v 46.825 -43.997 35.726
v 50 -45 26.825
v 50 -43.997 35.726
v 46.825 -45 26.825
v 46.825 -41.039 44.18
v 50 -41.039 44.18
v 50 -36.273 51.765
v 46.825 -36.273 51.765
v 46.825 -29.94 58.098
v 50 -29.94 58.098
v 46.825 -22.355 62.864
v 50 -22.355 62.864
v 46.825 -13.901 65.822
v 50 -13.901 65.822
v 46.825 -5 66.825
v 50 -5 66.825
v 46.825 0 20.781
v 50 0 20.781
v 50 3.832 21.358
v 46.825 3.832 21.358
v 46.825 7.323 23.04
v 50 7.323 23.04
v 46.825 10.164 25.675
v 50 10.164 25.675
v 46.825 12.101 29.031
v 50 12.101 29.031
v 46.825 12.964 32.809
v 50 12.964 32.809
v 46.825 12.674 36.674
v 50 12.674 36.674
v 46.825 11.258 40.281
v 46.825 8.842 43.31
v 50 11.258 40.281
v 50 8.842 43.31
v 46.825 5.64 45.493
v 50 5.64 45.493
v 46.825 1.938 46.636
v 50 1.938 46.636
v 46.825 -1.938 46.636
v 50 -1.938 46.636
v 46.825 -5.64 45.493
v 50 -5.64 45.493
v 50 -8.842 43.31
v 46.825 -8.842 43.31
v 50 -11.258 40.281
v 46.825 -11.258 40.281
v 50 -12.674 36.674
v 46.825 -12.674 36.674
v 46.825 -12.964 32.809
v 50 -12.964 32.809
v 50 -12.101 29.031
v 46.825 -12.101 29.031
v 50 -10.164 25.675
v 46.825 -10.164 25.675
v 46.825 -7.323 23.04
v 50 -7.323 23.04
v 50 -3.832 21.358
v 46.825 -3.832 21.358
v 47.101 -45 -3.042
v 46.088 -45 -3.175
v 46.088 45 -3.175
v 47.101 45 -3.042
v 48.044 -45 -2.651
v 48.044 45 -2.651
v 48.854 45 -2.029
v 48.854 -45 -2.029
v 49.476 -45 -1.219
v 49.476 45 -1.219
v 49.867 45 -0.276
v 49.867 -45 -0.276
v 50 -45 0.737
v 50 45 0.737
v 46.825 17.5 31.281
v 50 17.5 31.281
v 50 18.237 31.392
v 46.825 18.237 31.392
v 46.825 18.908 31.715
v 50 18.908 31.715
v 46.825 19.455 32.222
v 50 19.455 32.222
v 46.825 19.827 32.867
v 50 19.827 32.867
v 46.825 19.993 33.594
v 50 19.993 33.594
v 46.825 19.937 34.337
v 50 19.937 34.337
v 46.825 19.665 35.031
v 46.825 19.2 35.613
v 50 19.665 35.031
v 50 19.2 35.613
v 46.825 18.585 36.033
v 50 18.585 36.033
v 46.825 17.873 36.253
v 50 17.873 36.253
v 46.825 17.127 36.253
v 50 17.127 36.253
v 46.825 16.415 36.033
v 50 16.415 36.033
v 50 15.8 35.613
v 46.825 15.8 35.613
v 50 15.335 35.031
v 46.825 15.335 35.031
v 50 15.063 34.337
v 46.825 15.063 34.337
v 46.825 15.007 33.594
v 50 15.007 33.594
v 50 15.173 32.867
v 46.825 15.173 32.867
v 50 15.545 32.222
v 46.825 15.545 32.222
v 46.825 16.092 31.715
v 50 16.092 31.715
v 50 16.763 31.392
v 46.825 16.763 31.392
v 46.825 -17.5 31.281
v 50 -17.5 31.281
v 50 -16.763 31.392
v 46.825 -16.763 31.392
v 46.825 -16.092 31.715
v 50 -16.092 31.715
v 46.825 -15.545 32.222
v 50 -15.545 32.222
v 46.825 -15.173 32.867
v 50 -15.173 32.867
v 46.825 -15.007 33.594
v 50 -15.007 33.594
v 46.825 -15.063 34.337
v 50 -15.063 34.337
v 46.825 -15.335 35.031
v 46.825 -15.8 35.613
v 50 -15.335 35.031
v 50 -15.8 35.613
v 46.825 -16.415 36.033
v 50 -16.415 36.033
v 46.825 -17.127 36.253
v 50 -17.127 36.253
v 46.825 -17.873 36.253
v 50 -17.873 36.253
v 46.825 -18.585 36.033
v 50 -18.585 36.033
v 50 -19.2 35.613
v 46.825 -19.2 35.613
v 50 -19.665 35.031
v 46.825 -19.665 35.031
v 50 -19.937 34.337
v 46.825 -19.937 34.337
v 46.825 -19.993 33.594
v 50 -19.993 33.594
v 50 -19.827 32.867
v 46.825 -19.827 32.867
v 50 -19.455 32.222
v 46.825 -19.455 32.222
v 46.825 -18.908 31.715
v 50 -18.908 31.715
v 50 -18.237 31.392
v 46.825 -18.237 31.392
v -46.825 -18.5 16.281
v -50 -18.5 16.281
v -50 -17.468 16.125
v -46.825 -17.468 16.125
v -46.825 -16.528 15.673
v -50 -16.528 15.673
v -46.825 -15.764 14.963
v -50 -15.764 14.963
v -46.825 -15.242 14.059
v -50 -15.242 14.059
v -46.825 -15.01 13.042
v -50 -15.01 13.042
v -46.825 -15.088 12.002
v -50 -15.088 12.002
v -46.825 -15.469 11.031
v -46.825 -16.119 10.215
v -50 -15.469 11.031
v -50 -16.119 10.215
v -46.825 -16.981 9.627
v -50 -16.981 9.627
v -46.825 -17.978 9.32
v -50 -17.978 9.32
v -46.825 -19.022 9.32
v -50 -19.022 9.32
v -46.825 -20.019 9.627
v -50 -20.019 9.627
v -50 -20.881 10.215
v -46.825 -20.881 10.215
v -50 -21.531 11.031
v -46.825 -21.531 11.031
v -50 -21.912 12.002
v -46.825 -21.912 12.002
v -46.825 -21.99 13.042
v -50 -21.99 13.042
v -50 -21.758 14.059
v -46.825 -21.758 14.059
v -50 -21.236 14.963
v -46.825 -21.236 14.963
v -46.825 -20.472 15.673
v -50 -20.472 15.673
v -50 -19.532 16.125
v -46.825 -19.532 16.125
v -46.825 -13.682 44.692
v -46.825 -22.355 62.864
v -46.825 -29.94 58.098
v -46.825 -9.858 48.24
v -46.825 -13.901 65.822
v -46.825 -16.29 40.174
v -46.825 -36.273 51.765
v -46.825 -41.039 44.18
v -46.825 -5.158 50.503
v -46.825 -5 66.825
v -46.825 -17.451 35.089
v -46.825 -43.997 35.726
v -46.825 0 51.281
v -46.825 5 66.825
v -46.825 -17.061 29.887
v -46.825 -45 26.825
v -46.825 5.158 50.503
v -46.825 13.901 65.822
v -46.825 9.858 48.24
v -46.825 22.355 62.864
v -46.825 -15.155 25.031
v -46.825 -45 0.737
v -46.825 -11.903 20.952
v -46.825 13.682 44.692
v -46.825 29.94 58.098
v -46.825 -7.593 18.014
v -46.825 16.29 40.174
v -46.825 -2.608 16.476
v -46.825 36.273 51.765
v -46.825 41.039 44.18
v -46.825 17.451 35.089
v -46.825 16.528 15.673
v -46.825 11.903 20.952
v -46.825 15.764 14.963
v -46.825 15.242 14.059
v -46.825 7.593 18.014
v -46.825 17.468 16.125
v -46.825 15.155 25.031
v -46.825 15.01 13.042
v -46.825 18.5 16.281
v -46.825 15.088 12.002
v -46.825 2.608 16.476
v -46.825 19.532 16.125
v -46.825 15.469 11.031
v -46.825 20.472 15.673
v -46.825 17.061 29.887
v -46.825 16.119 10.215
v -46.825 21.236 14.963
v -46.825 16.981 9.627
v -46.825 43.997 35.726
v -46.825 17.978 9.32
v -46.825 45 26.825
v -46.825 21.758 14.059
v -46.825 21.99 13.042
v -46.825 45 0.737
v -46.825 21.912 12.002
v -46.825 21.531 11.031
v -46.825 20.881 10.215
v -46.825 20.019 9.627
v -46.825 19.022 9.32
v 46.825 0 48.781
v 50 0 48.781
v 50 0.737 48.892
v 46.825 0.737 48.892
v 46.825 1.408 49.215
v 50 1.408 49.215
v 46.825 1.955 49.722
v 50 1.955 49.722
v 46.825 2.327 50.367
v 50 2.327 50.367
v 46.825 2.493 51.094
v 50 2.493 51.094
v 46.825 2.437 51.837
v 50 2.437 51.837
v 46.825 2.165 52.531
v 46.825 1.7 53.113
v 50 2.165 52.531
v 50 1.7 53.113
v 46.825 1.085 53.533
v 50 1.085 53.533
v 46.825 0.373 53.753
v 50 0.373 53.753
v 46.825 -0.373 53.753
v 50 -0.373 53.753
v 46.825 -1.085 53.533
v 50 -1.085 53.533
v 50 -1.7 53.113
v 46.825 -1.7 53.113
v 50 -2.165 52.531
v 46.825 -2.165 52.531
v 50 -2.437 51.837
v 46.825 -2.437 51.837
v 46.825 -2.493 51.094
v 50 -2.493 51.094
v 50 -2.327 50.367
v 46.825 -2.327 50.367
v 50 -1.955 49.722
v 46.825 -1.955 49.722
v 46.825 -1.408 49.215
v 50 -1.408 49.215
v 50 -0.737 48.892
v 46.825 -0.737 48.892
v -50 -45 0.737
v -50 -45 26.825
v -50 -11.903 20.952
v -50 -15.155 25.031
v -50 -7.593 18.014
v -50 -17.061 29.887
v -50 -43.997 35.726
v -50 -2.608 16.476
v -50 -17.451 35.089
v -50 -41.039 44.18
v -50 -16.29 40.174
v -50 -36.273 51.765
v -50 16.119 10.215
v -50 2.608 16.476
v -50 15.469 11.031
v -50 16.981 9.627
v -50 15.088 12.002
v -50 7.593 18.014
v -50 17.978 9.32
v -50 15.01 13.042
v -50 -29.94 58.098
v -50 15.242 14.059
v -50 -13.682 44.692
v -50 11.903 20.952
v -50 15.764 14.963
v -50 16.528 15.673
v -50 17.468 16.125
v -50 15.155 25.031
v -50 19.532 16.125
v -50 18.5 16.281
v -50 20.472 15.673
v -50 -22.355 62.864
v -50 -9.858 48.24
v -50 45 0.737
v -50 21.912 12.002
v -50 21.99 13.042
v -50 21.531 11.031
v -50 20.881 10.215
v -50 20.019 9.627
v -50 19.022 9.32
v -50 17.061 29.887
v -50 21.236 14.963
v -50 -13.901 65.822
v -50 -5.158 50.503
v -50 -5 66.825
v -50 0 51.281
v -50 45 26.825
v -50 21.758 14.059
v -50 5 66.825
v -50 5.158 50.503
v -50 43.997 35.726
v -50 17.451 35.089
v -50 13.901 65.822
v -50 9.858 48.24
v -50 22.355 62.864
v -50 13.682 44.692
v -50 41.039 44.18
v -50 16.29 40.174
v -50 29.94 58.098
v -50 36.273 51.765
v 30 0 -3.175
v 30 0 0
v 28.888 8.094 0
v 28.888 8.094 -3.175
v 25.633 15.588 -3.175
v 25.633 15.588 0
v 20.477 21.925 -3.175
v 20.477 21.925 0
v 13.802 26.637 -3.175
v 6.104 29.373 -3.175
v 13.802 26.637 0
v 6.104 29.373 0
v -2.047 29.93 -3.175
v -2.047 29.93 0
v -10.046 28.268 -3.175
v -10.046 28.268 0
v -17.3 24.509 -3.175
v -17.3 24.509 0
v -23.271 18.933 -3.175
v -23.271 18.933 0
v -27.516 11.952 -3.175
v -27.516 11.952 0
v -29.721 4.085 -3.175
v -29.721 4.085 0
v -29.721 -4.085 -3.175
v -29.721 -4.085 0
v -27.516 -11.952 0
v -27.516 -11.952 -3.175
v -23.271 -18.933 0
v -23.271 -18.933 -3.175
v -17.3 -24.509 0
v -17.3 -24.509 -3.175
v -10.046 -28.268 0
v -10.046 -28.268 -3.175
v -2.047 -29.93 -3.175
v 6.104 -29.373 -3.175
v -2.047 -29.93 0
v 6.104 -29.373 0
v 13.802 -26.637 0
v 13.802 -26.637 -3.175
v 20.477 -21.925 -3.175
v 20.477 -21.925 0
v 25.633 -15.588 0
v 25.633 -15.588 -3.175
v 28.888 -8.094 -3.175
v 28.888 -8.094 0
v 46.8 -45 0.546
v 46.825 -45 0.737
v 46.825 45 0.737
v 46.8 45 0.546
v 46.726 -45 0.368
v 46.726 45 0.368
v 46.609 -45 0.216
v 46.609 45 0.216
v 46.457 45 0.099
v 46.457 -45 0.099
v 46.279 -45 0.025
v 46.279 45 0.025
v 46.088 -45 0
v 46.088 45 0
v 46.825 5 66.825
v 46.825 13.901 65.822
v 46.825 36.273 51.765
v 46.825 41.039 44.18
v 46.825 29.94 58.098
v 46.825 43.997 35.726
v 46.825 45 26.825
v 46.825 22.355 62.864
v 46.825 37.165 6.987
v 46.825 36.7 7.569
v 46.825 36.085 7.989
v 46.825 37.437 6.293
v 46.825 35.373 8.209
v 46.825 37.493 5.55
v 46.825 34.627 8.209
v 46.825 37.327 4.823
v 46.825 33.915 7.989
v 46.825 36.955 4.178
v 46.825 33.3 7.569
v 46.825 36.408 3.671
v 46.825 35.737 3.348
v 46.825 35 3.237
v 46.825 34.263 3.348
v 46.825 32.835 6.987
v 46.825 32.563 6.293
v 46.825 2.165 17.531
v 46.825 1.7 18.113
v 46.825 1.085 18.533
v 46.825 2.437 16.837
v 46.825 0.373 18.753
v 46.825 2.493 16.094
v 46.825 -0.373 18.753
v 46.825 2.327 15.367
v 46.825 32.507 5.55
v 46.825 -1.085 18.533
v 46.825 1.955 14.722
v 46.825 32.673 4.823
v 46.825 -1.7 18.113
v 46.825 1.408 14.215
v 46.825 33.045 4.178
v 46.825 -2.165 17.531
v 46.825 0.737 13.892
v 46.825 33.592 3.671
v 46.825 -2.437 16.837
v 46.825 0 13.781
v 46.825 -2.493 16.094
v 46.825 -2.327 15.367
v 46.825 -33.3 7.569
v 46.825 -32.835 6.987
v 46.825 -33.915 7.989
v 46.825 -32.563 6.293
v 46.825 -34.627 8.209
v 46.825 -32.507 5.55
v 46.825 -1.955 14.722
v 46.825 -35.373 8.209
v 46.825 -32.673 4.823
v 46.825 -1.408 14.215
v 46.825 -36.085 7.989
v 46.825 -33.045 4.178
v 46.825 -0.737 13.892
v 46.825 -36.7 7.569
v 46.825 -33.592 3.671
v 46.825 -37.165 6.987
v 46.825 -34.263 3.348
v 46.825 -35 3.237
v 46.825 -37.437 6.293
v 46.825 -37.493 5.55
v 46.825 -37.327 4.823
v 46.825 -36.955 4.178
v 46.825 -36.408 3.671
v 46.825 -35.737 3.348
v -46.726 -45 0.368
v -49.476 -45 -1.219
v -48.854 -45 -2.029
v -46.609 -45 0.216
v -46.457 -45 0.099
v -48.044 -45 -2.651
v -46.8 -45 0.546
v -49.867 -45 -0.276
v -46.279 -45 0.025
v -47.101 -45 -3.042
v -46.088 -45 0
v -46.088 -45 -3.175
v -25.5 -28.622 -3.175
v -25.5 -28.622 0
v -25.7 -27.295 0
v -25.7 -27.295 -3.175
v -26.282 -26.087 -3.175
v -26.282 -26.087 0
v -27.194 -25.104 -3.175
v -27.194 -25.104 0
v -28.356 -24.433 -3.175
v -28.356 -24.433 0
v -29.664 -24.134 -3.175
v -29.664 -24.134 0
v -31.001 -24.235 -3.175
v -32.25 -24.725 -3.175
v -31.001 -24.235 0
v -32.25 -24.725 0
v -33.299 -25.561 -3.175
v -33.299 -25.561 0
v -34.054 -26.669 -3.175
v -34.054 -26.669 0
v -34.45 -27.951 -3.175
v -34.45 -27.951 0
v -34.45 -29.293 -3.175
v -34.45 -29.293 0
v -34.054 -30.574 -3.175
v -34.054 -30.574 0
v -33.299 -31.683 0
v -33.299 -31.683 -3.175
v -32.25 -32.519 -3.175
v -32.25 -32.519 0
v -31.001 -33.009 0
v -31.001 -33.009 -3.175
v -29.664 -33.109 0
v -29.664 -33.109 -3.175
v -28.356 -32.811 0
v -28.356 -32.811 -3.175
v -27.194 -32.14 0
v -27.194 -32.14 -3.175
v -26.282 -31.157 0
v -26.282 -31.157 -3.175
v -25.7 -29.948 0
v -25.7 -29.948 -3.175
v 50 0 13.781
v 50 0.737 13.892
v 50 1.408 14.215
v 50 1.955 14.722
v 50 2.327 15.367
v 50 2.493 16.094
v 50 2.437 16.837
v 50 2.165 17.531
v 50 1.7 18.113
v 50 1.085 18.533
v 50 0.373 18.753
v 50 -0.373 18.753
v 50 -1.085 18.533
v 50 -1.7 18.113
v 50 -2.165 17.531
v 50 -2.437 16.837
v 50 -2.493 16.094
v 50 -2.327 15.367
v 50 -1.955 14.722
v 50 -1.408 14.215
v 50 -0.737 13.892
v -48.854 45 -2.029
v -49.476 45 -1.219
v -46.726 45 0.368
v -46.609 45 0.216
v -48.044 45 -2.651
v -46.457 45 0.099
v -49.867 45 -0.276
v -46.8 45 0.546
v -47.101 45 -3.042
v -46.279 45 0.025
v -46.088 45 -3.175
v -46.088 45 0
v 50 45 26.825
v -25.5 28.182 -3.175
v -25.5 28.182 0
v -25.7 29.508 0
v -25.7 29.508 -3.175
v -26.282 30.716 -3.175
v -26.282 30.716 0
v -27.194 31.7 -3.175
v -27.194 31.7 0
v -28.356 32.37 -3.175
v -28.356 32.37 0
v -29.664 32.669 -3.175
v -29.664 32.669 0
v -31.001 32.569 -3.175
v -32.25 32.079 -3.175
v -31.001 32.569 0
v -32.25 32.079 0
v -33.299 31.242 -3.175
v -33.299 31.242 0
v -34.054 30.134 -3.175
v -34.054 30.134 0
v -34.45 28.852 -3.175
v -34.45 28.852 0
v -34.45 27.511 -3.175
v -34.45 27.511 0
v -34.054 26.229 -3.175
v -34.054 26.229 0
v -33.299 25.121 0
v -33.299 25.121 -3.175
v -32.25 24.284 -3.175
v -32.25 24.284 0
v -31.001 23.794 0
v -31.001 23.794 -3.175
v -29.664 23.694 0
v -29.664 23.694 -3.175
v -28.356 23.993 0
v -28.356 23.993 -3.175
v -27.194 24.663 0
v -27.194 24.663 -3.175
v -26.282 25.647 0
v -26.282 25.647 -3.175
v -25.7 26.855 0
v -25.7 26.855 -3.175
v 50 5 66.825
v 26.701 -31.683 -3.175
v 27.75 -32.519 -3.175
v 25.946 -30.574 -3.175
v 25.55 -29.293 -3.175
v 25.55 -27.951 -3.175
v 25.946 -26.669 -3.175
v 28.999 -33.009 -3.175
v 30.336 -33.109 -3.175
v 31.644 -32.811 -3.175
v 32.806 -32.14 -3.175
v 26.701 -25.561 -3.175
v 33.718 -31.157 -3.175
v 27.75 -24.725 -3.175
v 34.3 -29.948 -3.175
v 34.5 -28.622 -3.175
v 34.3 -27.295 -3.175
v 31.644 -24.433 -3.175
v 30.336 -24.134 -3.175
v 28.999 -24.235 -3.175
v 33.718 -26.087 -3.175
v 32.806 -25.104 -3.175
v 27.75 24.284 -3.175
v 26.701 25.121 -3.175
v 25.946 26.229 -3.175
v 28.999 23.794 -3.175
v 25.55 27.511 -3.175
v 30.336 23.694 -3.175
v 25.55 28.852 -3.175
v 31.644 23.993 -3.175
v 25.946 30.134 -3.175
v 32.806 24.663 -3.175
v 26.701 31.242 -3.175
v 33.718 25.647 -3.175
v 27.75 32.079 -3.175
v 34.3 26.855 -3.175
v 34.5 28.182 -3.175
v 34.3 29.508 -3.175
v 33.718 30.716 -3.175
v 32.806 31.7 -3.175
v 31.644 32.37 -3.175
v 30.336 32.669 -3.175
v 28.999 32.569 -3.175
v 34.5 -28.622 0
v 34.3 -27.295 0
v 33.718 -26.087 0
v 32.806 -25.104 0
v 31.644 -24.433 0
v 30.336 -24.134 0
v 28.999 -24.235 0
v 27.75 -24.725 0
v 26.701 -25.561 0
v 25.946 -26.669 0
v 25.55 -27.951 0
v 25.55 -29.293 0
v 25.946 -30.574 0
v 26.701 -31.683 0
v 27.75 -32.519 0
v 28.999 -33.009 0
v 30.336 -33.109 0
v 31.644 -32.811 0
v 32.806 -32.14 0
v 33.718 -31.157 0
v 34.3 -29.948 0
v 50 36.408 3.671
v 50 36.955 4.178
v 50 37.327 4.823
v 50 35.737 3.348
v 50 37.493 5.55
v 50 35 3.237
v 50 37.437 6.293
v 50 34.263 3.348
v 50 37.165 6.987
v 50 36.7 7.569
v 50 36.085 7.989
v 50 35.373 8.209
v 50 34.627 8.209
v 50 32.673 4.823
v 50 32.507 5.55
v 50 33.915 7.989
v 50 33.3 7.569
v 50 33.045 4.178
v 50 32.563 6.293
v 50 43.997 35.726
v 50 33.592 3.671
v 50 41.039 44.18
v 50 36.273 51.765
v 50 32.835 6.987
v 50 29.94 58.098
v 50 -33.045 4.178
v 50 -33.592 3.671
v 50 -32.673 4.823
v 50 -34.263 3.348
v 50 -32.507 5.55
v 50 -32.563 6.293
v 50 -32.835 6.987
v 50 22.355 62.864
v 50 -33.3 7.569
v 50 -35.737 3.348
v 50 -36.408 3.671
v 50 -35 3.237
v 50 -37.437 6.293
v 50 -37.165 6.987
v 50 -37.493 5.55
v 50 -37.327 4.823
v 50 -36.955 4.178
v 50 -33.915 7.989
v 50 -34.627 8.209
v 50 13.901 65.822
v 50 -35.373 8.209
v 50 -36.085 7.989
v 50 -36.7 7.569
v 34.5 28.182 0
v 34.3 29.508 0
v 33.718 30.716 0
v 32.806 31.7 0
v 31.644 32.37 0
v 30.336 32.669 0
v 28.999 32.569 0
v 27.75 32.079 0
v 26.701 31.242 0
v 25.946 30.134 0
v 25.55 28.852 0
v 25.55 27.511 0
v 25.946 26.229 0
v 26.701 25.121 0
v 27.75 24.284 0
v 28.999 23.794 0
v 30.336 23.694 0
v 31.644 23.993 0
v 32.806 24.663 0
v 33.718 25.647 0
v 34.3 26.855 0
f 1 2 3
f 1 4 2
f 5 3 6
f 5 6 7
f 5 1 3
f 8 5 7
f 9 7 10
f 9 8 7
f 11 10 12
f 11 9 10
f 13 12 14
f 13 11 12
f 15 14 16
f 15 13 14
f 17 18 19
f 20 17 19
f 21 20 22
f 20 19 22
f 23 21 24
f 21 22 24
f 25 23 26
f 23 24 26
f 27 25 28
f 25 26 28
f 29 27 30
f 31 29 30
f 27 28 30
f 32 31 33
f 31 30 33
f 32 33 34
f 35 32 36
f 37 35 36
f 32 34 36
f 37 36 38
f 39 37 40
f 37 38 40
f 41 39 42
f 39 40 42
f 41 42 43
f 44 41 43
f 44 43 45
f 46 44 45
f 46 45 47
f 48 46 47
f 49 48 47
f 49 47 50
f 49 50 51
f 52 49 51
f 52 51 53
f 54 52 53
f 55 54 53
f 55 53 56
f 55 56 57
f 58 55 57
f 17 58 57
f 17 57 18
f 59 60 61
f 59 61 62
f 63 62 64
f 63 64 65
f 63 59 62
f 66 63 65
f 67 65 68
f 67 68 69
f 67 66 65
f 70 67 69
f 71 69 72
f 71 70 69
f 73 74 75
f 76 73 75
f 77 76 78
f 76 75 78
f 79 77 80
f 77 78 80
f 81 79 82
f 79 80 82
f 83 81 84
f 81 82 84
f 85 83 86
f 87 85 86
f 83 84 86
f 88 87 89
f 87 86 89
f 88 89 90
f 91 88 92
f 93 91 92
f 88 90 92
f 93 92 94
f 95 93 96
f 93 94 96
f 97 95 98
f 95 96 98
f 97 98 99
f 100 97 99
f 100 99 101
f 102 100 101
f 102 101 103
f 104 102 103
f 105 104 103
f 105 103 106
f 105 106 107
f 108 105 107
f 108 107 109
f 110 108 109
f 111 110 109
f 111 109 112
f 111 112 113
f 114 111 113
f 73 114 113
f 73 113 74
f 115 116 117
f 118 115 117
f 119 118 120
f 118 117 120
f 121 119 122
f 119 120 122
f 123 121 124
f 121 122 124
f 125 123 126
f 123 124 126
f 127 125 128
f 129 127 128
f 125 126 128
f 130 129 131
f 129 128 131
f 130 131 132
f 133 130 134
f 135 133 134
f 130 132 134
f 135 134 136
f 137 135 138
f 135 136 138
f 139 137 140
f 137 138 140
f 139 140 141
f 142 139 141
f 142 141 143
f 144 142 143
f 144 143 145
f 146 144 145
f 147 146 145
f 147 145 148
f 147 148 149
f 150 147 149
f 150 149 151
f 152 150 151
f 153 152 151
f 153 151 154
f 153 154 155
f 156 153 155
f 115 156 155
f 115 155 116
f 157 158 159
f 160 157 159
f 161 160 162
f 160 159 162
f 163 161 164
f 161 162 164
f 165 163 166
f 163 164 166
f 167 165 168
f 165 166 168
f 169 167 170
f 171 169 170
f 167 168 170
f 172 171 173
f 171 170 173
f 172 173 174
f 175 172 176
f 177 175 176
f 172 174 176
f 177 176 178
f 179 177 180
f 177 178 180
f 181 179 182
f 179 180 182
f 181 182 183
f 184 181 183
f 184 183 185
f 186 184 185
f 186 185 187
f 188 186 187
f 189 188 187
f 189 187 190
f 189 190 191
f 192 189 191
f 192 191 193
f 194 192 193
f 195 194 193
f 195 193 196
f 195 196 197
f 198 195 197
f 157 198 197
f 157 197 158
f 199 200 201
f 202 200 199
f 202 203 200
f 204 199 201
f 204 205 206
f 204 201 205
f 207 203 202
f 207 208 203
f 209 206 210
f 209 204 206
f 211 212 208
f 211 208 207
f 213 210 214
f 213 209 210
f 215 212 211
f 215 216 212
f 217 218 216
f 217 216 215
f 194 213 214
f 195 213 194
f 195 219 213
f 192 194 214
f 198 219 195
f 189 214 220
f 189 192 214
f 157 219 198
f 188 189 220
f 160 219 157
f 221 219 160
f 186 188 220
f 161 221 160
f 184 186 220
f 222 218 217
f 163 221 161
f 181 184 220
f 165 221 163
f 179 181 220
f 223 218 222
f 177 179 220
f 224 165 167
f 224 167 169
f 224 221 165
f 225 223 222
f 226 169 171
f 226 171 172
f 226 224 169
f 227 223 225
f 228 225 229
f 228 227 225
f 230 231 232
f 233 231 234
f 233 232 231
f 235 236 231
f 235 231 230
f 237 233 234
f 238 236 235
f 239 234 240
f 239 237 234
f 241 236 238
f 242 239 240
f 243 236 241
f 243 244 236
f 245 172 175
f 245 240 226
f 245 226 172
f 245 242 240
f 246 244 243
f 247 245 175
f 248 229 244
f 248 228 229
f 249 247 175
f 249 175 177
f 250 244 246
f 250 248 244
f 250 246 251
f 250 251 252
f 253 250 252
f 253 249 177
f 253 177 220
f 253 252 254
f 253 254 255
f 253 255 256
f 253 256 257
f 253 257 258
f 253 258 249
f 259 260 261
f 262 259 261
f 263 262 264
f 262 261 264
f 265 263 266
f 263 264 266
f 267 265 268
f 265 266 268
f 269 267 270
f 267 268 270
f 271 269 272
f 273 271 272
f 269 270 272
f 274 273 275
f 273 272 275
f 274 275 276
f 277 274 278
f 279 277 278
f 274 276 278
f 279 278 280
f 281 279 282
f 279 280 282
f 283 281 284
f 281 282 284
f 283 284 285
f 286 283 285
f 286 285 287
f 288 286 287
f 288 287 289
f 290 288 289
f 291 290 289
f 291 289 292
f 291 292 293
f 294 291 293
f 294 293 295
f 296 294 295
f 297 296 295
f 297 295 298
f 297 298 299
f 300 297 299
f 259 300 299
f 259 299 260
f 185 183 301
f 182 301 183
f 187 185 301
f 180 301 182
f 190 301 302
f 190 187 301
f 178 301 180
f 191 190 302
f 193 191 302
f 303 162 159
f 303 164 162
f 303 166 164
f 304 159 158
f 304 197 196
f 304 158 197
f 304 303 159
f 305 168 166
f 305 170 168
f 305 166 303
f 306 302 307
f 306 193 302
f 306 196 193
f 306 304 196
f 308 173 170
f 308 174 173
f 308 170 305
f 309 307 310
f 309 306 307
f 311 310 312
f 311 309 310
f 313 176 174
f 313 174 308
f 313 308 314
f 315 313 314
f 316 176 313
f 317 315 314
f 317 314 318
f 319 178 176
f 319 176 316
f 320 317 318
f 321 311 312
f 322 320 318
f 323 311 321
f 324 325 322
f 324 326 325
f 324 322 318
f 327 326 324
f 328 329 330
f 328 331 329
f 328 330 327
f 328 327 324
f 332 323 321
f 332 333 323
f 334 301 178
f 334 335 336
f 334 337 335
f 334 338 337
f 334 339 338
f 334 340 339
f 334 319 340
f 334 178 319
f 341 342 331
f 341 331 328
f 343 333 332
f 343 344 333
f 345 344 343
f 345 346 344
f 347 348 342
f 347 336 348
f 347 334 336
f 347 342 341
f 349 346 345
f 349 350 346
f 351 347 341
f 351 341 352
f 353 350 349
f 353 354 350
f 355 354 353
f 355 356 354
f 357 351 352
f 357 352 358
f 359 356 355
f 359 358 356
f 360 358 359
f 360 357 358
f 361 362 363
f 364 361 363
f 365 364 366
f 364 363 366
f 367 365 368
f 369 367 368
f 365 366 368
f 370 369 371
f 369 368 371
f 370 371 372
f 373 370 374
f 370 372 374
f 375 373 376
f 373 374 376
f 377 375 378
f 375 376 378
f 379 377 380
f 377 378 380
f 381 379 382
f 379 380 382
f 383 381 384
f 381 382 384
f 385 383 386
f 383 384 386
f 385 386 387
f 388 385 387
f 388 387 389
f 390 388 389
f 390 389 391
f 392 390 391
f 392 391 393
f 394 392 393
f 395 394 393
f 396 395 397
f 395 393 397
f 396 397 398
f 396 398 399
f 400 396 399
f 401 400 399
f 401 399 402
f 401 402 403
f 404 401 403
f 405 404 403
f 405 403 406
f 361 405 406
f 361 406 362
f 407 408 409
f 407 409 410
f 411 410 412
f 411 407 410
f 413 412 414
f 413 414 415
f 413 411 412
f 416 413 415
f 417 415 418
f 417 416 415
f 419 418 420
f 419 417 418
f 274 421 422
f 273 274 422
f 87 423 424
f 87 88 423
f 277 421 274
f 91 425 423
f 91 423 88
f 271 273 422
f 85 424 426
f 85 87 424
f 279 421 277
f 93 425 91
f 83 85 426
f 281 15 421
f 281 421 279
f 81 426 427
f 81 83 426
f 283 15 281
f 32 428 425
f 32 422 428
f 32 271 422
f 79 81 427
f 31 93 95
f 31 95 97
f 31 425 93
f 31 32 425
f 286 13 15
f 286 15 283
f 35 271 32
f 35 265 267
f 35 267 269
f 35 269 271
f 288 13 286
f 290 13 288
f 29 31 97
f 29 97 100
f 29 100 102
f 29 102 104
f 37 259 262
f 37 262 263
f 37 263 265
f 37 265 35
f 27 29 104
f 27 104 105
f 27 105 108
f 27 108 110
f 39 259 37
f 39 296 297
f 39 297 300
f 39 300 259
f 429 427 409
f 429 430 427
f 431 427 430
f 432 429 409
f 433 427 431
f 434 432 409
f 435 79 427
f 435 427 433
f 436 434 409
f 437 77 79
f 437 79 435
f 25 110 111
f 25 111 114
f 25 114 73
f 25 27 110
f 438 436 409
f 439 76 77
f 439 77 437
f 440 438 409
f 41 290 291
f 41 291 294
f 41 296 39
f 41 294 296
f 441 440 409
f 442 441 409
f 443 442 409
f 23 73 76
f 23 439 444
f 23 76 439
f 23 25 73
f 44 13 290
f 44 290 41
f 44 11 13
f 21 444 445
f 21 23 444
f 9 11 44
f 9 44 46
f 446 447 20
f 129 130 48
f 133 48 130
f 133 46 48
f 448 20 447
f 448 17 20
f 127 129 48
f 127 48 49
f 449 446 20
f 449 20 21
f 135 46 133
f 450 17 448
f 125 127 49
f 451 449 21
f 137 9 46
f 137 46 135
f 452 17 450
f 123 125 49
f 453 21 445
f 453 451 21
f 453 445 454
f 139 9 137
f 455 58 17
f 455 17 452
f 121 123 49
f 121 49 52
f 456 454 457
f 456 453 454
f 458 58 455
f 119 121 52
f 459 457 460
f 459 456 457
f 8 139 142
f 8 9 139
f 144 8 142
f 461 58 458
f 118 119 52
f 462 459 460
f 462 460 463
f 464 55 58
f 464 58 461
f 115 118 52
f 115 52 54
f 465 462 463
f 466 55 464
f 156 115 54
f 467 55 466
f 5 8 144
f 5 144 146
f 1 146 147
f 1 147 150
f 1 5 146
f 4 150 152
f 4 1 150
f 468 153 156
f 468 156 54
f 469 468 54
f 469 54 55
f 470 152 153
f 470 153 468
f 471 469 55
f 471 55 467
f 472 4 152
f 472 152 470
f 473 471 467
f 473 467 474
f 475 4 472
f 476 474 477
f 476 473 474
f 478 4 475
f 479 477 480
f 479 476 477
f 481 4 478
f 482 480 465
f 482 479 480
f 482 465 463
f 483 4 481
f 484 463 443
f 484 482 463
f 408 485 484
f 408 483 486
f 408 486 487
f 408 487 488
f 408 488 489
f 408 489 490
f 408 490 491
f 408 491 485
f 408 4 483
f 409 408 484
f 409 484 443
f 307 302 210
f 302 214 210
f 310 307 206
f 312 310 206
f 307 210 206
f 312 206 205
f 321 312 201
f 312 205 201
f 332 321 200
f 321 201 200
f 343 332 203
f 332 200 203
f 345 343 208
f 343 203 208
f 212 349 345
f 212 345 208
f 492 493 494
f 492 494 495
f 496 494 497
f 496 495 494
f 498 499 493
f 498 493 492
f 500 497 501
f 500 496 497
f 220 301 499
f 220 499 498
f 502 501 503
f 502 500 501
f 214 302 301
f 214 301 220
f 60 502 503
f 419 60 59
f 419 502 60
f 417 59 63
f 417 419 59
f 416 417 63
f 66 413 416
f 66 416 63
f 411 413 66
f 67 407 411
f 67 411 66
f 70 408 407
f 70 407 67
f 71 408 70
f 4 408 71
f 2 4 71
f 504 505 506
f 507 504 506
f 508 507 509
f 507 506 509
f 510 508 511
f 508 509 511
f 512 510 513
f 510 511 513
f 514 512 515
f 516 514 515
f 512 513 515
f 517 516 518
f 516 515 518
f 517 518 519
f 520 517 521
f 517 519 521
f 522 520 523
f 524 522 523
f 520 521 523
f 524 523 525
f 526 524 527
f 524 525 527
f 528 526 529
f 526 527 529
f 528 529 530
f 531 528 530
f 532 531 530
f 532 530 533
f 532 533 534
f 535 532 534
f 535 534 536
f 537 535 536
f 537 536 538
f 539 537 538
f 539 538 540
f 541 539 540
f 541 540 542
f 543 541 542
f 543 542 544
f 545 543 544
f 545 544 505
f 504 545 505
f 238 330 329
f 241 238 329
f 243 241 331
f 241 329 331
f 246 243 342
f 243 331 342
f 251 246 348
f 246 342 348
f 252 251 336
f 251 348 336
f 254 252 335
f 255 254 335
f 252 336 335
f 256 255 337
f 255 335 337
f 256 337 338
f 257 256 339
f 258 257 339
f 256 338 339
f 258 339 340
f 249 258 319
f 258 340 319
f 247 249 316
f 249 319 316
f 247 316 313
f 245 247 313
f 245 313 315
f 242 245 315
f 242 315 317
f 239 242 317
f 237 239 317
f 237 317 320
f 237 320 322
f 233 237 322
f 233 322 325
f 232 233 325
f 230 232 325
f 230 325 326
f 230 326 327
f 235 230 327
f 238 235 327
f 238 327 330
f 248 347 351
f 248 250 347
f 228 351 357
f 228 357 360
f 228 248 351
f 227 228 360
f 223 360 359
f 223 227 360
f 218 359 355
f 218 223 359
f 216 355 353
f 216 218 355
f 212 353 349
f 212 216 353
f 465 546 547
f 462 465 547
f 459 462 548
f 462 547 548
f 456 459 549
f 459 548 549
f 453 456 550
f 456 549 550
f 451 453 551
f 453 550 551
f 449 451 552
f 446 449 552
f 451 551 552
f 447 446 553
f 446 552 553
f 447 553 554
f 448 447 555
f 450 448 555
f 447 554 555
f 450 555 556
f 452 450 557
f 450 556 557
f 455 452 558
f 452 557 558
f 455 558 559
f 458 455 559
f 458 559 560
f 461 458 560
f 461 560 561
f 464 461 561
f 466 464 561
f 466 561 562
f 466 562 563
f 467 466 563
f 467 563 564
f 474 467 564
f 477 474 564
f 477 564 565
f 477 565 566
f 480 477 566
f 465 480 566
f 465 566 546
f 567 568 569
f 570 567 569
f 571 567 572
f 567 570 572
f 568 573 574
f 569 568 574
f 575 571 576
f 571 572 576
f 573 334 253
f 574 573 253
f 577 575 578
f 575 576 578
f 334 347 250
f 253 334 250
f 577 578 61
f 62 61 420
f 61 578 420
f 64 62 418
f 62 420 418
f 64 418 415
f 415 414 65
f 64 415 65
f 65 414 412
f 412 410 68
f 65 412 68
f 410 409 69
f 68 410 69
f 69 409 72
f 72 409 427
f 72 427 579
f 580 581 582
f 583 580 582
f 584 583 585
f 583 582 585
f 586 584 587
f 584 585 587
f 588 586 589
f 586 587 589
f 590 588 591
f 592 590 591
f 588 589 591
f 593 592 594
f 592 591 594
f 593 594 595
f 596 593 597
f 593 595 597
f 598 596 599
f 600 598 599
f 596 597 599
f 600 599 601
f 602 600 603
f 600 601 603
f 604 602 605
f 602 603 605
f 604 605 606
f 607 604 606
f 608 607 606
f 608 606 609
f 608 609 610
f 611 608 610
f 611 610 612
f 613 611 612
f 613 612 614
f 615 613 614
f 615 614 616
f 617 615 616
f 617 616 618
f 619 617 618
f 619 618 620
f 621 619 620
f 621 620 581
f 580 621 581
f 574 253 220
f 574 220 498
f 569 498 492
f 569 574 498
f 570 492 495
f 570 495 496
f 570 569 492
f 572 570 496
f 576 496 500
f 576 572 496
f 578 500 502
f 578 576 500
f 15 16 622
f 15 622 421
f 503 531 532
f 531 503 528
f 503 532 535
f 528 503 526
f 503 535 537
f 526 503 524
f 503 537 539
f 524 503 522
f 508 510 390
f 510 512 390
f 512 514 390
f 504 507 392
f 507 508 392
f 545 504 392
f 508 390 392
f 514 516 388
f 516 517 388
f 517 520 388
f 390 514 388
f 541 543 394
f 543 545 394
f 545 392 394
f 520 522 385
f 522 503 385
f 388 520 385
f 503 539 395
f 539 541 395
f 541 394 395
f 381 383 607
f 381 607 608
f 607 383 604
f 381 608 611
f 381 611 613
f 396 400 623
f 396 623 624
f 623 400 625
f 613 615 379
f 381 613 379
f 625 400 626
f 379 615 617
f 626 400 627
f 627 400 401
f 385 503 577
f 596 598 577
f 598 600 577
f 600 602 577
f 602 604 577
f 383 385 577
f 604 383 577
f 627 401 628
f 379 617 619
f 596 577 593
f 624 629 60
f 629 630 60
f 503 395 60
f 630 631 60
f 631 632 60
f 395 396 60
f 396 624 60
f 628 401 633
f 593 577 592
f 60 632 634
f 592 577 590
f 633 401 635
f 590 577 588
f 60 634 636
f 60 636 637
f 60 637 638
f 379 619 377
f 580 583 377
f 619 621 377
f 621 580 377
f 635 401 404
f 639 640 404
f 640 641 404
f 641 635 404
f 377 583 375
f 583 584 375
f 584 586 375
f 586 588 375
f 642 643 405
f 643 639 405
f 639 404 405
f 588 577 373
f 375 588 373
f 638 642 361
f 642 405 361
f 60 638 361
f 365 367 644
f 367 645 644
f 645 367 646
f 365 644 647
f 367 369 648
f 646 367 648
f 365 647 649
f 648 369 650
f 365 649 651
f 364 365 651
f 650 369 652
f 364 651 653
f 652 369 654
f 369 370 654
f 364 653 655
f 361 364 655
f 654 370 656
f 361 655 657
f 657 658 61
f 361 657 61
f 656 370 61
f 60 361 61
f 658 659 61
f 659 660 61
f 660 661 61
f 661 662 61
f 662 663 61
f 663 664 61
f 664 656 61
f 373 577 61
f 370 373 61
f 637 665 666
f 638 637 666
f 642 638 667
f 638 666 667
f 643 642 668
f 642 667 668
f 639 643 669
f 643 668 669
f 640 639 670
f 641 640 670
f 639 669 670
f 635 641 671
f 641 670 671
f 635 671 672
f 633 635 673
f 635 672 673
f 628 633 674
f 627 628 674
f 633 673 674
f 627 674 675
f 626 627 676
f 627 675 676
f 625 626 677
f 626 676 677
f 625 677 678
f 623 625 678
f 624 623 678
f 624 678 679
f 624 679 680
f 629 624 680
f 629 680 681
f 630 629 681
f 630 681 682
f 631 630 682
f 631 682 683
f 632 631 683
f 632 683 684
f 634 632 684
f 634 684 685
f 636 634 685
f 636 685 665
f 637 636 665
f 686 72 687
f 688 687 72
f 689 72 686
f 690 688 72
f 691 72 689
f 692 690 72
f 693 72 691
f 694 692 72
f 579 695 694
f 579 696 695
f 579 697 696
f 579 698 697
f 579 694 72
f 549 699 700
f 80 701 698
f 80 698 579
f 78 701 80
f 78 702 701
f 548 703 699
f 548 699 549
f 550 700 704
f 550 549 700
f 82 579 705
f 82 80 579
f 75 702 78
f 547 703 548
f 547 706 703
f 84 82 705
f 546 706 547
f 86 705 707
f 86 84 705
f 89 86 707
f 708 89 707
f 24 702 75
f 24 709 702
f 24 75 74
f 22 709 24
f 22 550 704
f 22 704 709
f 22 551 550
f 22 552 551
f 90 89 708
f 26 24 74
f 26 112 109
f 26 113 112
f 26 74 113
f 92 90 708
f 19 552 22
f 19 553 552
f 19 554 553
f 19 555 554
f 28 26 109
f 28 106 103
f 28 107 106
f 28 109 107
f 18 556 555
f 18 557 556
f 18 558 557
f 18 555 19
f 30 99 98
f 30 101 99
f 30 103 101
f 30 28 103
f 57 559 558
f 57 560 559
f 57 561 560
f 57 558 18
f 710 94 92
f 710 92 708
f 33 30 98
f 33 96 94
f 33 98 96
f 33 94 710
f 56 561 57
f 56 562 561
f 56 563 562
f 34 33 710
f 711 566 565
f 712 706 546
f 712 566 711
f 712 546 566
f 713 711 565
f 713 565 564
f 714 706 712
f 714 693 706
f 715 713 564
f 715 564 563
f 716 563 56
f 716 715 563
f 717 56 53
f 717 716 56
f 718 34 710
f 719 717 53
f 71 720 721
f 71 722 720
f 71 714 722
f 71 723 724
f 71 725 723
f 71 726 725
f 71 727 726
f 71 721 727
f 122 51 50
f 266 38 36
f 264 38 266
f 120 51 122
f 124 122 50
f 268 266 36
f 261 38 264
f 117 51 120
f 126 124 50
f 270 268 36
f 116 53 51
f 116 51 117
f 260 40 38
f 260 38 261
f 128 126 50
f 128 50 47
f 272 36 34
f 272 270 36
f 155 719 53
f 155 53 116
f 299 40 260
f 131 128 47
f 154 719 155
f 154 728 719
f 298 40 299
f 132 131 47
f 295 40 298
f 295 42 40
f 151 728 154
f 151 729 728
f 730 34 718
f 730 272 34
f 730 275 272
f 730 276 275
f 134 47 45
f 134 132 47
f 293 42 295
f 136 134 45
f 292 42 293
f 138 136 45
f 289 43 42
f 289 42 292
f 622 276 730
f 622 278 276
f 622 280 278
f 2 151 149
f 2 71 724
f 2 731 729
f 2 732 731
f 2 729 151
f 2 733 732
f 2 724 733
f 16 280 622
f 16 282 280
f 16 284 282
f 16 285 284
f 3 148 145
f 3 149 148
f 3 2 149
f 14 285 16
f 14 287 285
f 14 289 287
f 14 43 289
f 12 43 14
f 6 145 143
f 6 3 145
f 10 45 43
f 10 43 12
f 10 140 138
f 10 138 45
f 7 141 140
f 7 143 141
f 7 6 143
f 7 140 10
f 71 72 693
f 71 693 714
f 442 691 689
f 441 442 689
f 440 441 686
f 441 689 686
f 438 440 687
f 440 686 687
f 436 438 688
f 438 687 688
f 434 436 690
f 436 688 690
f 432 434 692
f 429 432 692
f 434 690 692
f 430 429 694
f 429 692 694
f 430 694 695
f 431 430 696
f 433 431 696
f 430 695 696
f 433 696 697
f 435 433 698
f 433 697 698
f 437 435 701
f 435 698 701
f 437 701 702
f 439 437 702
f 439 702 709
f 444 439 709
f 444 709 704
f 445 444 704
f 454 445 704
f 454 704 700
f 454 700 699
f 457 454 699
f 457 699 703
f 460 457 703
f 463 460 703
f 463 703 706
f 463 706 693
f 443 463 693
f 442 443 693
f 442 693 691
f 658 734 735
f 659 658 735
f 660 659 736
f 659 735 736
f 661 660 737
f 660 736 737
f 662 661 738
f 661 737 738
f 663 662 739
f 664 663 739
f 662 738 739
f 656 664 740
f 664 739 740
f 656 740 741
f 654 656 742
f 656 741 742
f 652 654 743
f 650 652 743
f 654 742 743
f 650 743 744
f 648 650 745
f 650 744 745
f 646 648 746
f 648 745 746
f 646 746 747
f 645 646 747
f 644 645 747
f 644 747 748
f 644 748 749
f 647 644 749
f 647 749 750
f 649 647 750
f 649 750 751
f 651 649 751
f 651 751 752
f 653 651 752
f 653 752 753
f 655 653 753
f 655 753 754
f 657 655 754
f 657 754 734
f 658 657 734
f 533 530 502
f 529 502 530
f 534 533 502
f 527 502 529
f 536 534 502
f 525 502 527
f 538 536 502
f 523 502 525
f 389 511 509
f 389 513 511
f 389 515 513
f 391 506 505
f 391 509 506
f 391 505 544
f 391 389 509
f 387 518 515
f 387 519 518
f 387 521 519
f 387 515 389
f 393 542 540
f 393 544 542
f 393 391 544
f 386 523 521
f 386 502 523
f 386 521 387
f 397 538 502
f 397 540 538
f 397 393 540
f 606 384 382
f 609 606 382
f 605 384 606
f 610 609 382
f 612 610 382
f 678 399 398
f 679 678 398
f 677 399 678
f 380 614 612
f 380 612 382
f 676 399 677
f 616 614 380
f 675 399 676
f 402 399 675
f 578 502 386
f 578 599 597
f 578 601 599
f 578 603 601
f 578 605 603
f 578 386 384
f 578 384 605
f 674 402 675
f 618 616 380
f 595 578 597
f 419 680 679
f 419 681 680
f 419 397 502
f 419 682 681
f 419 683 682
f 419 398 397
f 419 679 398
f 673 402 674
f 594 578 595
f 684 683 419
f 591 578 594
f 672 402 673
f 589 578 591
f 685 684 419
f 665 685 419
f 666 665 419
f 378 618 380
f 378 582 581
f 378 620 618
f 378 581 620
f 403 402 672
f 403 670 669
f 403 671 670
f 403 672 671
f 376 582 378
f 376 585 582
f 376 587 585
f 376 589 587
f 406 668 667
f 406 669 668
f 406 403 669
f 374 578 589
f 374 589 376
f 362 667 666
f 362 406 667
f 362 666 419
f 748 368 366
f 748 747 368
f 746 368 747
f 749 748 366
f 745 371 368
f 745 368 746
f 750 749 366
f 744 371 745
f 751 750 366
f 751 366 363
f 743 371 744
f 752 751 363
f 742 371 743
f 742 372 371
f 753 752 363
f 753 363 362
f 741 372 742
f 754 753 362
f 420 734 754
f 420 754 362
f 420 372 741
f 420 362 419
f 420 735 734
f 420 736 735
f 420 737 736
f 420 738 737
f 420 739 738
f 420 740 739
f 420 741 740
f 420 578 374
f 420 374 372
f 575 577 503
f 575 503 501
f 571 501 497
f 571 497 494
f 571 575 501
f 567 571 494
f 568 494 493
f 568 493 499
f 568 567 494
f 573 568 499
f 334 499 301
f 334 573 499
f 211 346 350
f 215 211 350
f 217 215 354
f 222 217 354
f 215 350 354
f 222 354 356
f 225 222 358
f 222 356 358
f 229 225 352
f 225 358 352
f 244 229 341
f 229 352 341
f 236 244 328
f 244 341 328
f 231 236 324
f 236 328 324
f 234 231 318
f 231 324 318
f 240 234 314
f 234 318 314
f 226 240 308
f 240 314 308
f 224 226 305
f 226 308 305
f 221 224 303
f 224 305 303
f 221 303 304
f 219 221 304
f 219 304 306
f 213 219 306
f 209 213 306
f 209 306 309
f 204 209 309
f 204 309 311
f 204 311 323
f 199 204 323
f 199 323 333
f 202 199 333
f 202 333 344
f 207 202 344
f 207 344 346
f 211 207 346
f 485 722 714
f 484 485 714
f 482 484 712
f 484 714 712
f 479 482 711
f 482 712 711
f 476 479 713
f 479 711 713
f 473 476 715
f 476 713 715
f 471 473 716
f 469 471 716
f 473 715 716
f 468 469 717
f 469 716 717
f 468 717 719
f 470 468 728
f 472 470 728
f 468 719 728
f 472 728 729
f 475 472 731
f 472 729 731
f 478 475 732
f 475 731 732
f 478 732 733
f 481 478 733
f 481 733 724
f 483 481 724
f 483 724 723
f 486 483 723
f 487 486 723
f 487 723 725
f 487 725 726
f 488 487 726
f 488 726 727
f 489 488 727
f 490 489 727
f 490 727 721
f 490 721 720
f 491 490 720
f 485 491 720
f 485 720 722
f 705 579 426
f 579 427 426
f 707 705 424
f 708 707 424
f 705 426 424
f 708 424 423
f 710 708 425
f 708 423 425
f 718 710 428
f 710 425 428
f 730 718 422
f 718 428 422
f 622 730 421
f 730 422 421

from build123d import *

# Parameters (mm, degrees)
CROQUIS22_W                        = 100
CROQUIS22_H                        = 90
BRIDA_BASE4_DEPTH                  = 3.175
BRIDA_DE_ARISTA1_STRIP_W           = 14.1732
BRIDA_DE_ARISTA1_STRIP_H           = 3.175
BRIDA_DE_ARISTA1_STRIP_CUT_DEPTH   = 90
BRIDA_DE_ARISTA1_STRIP_2_W         = 14.1732
BRIDA_DE_ARISTA1_STRIP_2_H         = 3.175
BRIDA_DE_ARISTA1_STRIP_CUT_2_DEPTH = 90
BRIDA_DE_ARISTA1_DEPTH             = 90
BRIDA_DE_ARISTA1_BEND_DEPTH        = 90
CROQUIS33_R                        = 8
CROQUIS33_R_2                      = 3.5
CORTAR_EXTRUIR3_DEPTH              = 14.7625
CROQUIS35_R                        = 13
CROQUIS35_R_2                      = 2.5
CORTAR_EXTRUIR4_DEPTH              = 14.7625
CROQUIS36_R                        = 17.5
CORTAR_EXTRUIR5_DEPTH              = 14.7625
CROQUIS37_R                        = 4.5
CROQUIS37_R_2                      = 30
CORTAR_EXTRUIR6_DEPTH              = 14.7625
REDONDEO1_R                        = 40
CROQUIS40_R                        = 2.5
CORTAR_EXTRUIR7_DEPTH              = 14.7625


# Sheet-metal steps are written as plain solids
with BuildPart() as part:
    # Croquis22 → Brida base4 (new body)
    with BuildSketch(Plane.XY):
        Rectangle(CROQUIS22_W, CROQUIS22_H)
    extrude(amount=-BRIDA_BASE4_DEPTH)

    # Brida de arista1 strip (across the edge) → Brida de arista1 strip cut (cut)
    with BuildSketch(Plane(origin=(-50, 45, 0), x_dir=(1, 0, 0), z_dir=(0, -1, 0))):
        with Locations((-3.175, -1.5875)):
            Rectangle(BRIDA_DE_ARISTA1_STRIP_W, BRIDA_DE_ARISTA1_STRIP_H)
    extrude(amount=BRIDA_DE_ARISTA1_STRIP_CUT_DEPTH, mode=Mode.SUBTRACT)

    # Brida de arista1 strip 2 (across the edge) → Brida de arista1 strip cut 2 (cut)
    with BuildSketch(Plane(origin=(50, -45, 0), x_dir=(-1, 0, 0), z_dir=(0, 1, 0))):
        with Locations((-3.175, -1.5875)):
            Rectangle(BRIDA_DE_ARISTA1_STRIP_2_W, BRIDA_DE_ARISTA1_STRIP_2_H)
    extrude(amount=BRIDA_DE_ARISTA1_STRIP_CUT_2_DEPTH, mode=Mode.SUBTRACT)

    # Brida de arista1 section (across the edge) → Brida de arista1 (add)
    with BuildSketch(Plane(origin=(-50, 45, 0), x_dir=(1, 0, 0), z_dir=(0, -1, 0))):
        with BuildLine():
            Line((0, 0.7366), (0, 66.825))
            Line((0, 66.825), (3.175, 66.825))
            Line((3.175, 66.825), (3.175, 0.7366))
            ThreePointArc((3.175, 0.7366), (3.390745145, 0.215745145), (3.9116, 0))
            Line((3.9116, 0), (3.9116, -3.175))
            ThreePointArc((3.9116, -3.175), (1.145681115, -2.029318885), (0, 0.7366))
        make_face()
    extrude(amount=BRIDA_DE_ARISTA1_DEPTH)

    # Brida de arista1 section 2 (across the edge) → Brida de arista1 bend (add)
    with BuildSketch(Plane(origin=(50, -45, 0), x_dir=(-1, 0, 0), z_dir=(0, 1, 0))):
        with BuildLine():
            Line((0, 0.7366), (0, 66.825))
            Line((0, 66.825), (3.175, 66.825))
            Line((3.175, 66.825), (3.175, 0.7366))
            ThreePointArc((3.175, 0.7366), (3.390745145, 0.215745145), (3.9116, 0))
            Line((3.9116, 0), (3.9116, -3.175))
            ThreePointArc((3.9116, -3.175), (1.145681115, -2.029318885), (0, 0.7366))
        make_face()
    extrude(amount=BRIDA_DE_ARISTA1_BEND_DEPTH)

    # Croquis33 → Cortar-Extruir3 (cut)
    with BuildSketch(Plane.ZY.offset(50)):
        with Locations((33.7808, 0)):
            Circle(CROQUIS33_R)
        with Locations((12.7808, 18.5)):
            Circle(CROQUIS33_R_2)
        with Locations((12.7808, -18.5)):
            Circle(CROQUIS33_R_2)
    extrude(amount=-CORTAR_EXTRUIR3_DEPTH, mode=Mode.SUBTRACT)

    # Croquis35 → Cortar-Extruir4 (cut)
    with BuildSketch(Plane(origin=(50, 0, 0), x_dir=(0, 0, -1), z_dir=(1, 0, 0))):
        with Locations((-33.7808, 0)):
            Circle(CROQUIS35_R)
        with Locations((-33.7808, 17.5)):
            Circle(CROQUIS35_R_2)
        with Locations((-33.7808, -17.5)):
            Circle(CROQUIS35_R_2)
        with Locations((-16.2808, 0)):
            Circle(CROQUIS35_R_2)
        with Locations((-51.2808, 0)):
            Circle(CROQUIS35_R_2)
    extrude(amount=-CORTAR_EXTRUIR4_DEPTH, mode=Mode.SUBTRACT)

    # Croquis36 → Cortar-Extruir5 (cut)
    with BuildSketch(Plane.ZY.offset(50)):
        with Locations((33.7808, 0)):
            Circle(CROQUIS36_R)
    extrude(amount=-CORTAR_EXTRUIR5_DEPTH, mode=Mode.SUBTRACT)

    # Croquis37 → Cortar-Extruir6 (cut)
    with BuildSketch(Plane.XY):
        with Locations((-30, 28.181524588)):
            Circle(CROQUIS37_R)
        with Locations((-30, -28.621860909)):
            Circle(CROQUIS37_R)
        with Locations((30, 28.181524588)):
            Circle(CROQUIS37_R)
        with Locations((30, -28.621860909)):
            Circle(CROQUIS37_R)
        Circle(CROQUIS37_R_2)
    extrude(amount=-CORTAR_EXTRUIR6_DEPTH, mode=Mode.SUBTRACT)

    # Redondeo1
    redondeo1_edges = [part.edges().sort_by_distance(p)[0] for p in [
        (-48.4125, 45, 66.825),
        (-48.4125, -45, 66.825),
        (48.4125, -45, 66.825),
        (48.4125, 45, 66.825),
    ]]
    fillet(redondeo1_edges, radius=REDONDEO1_R)

    # Croquis40 → Cortar-Extruir7 (cut)
    with BuildSketch(Plane(origin=(50, 0, 0), x_dir=(0, 0, -1), z_dir=(1, 0, 0))):
        with Locations((-5.7366, 35)):
            Circle(CROQUIS40_R)
        with Locations((-5.7366, -35)):
            Circle(CROQUIS40_R)
    extrude(amount=-CORTAR_EXTRUIR7_DEPTH, mode=Mode.SUBTRACT)


solid = part.part
